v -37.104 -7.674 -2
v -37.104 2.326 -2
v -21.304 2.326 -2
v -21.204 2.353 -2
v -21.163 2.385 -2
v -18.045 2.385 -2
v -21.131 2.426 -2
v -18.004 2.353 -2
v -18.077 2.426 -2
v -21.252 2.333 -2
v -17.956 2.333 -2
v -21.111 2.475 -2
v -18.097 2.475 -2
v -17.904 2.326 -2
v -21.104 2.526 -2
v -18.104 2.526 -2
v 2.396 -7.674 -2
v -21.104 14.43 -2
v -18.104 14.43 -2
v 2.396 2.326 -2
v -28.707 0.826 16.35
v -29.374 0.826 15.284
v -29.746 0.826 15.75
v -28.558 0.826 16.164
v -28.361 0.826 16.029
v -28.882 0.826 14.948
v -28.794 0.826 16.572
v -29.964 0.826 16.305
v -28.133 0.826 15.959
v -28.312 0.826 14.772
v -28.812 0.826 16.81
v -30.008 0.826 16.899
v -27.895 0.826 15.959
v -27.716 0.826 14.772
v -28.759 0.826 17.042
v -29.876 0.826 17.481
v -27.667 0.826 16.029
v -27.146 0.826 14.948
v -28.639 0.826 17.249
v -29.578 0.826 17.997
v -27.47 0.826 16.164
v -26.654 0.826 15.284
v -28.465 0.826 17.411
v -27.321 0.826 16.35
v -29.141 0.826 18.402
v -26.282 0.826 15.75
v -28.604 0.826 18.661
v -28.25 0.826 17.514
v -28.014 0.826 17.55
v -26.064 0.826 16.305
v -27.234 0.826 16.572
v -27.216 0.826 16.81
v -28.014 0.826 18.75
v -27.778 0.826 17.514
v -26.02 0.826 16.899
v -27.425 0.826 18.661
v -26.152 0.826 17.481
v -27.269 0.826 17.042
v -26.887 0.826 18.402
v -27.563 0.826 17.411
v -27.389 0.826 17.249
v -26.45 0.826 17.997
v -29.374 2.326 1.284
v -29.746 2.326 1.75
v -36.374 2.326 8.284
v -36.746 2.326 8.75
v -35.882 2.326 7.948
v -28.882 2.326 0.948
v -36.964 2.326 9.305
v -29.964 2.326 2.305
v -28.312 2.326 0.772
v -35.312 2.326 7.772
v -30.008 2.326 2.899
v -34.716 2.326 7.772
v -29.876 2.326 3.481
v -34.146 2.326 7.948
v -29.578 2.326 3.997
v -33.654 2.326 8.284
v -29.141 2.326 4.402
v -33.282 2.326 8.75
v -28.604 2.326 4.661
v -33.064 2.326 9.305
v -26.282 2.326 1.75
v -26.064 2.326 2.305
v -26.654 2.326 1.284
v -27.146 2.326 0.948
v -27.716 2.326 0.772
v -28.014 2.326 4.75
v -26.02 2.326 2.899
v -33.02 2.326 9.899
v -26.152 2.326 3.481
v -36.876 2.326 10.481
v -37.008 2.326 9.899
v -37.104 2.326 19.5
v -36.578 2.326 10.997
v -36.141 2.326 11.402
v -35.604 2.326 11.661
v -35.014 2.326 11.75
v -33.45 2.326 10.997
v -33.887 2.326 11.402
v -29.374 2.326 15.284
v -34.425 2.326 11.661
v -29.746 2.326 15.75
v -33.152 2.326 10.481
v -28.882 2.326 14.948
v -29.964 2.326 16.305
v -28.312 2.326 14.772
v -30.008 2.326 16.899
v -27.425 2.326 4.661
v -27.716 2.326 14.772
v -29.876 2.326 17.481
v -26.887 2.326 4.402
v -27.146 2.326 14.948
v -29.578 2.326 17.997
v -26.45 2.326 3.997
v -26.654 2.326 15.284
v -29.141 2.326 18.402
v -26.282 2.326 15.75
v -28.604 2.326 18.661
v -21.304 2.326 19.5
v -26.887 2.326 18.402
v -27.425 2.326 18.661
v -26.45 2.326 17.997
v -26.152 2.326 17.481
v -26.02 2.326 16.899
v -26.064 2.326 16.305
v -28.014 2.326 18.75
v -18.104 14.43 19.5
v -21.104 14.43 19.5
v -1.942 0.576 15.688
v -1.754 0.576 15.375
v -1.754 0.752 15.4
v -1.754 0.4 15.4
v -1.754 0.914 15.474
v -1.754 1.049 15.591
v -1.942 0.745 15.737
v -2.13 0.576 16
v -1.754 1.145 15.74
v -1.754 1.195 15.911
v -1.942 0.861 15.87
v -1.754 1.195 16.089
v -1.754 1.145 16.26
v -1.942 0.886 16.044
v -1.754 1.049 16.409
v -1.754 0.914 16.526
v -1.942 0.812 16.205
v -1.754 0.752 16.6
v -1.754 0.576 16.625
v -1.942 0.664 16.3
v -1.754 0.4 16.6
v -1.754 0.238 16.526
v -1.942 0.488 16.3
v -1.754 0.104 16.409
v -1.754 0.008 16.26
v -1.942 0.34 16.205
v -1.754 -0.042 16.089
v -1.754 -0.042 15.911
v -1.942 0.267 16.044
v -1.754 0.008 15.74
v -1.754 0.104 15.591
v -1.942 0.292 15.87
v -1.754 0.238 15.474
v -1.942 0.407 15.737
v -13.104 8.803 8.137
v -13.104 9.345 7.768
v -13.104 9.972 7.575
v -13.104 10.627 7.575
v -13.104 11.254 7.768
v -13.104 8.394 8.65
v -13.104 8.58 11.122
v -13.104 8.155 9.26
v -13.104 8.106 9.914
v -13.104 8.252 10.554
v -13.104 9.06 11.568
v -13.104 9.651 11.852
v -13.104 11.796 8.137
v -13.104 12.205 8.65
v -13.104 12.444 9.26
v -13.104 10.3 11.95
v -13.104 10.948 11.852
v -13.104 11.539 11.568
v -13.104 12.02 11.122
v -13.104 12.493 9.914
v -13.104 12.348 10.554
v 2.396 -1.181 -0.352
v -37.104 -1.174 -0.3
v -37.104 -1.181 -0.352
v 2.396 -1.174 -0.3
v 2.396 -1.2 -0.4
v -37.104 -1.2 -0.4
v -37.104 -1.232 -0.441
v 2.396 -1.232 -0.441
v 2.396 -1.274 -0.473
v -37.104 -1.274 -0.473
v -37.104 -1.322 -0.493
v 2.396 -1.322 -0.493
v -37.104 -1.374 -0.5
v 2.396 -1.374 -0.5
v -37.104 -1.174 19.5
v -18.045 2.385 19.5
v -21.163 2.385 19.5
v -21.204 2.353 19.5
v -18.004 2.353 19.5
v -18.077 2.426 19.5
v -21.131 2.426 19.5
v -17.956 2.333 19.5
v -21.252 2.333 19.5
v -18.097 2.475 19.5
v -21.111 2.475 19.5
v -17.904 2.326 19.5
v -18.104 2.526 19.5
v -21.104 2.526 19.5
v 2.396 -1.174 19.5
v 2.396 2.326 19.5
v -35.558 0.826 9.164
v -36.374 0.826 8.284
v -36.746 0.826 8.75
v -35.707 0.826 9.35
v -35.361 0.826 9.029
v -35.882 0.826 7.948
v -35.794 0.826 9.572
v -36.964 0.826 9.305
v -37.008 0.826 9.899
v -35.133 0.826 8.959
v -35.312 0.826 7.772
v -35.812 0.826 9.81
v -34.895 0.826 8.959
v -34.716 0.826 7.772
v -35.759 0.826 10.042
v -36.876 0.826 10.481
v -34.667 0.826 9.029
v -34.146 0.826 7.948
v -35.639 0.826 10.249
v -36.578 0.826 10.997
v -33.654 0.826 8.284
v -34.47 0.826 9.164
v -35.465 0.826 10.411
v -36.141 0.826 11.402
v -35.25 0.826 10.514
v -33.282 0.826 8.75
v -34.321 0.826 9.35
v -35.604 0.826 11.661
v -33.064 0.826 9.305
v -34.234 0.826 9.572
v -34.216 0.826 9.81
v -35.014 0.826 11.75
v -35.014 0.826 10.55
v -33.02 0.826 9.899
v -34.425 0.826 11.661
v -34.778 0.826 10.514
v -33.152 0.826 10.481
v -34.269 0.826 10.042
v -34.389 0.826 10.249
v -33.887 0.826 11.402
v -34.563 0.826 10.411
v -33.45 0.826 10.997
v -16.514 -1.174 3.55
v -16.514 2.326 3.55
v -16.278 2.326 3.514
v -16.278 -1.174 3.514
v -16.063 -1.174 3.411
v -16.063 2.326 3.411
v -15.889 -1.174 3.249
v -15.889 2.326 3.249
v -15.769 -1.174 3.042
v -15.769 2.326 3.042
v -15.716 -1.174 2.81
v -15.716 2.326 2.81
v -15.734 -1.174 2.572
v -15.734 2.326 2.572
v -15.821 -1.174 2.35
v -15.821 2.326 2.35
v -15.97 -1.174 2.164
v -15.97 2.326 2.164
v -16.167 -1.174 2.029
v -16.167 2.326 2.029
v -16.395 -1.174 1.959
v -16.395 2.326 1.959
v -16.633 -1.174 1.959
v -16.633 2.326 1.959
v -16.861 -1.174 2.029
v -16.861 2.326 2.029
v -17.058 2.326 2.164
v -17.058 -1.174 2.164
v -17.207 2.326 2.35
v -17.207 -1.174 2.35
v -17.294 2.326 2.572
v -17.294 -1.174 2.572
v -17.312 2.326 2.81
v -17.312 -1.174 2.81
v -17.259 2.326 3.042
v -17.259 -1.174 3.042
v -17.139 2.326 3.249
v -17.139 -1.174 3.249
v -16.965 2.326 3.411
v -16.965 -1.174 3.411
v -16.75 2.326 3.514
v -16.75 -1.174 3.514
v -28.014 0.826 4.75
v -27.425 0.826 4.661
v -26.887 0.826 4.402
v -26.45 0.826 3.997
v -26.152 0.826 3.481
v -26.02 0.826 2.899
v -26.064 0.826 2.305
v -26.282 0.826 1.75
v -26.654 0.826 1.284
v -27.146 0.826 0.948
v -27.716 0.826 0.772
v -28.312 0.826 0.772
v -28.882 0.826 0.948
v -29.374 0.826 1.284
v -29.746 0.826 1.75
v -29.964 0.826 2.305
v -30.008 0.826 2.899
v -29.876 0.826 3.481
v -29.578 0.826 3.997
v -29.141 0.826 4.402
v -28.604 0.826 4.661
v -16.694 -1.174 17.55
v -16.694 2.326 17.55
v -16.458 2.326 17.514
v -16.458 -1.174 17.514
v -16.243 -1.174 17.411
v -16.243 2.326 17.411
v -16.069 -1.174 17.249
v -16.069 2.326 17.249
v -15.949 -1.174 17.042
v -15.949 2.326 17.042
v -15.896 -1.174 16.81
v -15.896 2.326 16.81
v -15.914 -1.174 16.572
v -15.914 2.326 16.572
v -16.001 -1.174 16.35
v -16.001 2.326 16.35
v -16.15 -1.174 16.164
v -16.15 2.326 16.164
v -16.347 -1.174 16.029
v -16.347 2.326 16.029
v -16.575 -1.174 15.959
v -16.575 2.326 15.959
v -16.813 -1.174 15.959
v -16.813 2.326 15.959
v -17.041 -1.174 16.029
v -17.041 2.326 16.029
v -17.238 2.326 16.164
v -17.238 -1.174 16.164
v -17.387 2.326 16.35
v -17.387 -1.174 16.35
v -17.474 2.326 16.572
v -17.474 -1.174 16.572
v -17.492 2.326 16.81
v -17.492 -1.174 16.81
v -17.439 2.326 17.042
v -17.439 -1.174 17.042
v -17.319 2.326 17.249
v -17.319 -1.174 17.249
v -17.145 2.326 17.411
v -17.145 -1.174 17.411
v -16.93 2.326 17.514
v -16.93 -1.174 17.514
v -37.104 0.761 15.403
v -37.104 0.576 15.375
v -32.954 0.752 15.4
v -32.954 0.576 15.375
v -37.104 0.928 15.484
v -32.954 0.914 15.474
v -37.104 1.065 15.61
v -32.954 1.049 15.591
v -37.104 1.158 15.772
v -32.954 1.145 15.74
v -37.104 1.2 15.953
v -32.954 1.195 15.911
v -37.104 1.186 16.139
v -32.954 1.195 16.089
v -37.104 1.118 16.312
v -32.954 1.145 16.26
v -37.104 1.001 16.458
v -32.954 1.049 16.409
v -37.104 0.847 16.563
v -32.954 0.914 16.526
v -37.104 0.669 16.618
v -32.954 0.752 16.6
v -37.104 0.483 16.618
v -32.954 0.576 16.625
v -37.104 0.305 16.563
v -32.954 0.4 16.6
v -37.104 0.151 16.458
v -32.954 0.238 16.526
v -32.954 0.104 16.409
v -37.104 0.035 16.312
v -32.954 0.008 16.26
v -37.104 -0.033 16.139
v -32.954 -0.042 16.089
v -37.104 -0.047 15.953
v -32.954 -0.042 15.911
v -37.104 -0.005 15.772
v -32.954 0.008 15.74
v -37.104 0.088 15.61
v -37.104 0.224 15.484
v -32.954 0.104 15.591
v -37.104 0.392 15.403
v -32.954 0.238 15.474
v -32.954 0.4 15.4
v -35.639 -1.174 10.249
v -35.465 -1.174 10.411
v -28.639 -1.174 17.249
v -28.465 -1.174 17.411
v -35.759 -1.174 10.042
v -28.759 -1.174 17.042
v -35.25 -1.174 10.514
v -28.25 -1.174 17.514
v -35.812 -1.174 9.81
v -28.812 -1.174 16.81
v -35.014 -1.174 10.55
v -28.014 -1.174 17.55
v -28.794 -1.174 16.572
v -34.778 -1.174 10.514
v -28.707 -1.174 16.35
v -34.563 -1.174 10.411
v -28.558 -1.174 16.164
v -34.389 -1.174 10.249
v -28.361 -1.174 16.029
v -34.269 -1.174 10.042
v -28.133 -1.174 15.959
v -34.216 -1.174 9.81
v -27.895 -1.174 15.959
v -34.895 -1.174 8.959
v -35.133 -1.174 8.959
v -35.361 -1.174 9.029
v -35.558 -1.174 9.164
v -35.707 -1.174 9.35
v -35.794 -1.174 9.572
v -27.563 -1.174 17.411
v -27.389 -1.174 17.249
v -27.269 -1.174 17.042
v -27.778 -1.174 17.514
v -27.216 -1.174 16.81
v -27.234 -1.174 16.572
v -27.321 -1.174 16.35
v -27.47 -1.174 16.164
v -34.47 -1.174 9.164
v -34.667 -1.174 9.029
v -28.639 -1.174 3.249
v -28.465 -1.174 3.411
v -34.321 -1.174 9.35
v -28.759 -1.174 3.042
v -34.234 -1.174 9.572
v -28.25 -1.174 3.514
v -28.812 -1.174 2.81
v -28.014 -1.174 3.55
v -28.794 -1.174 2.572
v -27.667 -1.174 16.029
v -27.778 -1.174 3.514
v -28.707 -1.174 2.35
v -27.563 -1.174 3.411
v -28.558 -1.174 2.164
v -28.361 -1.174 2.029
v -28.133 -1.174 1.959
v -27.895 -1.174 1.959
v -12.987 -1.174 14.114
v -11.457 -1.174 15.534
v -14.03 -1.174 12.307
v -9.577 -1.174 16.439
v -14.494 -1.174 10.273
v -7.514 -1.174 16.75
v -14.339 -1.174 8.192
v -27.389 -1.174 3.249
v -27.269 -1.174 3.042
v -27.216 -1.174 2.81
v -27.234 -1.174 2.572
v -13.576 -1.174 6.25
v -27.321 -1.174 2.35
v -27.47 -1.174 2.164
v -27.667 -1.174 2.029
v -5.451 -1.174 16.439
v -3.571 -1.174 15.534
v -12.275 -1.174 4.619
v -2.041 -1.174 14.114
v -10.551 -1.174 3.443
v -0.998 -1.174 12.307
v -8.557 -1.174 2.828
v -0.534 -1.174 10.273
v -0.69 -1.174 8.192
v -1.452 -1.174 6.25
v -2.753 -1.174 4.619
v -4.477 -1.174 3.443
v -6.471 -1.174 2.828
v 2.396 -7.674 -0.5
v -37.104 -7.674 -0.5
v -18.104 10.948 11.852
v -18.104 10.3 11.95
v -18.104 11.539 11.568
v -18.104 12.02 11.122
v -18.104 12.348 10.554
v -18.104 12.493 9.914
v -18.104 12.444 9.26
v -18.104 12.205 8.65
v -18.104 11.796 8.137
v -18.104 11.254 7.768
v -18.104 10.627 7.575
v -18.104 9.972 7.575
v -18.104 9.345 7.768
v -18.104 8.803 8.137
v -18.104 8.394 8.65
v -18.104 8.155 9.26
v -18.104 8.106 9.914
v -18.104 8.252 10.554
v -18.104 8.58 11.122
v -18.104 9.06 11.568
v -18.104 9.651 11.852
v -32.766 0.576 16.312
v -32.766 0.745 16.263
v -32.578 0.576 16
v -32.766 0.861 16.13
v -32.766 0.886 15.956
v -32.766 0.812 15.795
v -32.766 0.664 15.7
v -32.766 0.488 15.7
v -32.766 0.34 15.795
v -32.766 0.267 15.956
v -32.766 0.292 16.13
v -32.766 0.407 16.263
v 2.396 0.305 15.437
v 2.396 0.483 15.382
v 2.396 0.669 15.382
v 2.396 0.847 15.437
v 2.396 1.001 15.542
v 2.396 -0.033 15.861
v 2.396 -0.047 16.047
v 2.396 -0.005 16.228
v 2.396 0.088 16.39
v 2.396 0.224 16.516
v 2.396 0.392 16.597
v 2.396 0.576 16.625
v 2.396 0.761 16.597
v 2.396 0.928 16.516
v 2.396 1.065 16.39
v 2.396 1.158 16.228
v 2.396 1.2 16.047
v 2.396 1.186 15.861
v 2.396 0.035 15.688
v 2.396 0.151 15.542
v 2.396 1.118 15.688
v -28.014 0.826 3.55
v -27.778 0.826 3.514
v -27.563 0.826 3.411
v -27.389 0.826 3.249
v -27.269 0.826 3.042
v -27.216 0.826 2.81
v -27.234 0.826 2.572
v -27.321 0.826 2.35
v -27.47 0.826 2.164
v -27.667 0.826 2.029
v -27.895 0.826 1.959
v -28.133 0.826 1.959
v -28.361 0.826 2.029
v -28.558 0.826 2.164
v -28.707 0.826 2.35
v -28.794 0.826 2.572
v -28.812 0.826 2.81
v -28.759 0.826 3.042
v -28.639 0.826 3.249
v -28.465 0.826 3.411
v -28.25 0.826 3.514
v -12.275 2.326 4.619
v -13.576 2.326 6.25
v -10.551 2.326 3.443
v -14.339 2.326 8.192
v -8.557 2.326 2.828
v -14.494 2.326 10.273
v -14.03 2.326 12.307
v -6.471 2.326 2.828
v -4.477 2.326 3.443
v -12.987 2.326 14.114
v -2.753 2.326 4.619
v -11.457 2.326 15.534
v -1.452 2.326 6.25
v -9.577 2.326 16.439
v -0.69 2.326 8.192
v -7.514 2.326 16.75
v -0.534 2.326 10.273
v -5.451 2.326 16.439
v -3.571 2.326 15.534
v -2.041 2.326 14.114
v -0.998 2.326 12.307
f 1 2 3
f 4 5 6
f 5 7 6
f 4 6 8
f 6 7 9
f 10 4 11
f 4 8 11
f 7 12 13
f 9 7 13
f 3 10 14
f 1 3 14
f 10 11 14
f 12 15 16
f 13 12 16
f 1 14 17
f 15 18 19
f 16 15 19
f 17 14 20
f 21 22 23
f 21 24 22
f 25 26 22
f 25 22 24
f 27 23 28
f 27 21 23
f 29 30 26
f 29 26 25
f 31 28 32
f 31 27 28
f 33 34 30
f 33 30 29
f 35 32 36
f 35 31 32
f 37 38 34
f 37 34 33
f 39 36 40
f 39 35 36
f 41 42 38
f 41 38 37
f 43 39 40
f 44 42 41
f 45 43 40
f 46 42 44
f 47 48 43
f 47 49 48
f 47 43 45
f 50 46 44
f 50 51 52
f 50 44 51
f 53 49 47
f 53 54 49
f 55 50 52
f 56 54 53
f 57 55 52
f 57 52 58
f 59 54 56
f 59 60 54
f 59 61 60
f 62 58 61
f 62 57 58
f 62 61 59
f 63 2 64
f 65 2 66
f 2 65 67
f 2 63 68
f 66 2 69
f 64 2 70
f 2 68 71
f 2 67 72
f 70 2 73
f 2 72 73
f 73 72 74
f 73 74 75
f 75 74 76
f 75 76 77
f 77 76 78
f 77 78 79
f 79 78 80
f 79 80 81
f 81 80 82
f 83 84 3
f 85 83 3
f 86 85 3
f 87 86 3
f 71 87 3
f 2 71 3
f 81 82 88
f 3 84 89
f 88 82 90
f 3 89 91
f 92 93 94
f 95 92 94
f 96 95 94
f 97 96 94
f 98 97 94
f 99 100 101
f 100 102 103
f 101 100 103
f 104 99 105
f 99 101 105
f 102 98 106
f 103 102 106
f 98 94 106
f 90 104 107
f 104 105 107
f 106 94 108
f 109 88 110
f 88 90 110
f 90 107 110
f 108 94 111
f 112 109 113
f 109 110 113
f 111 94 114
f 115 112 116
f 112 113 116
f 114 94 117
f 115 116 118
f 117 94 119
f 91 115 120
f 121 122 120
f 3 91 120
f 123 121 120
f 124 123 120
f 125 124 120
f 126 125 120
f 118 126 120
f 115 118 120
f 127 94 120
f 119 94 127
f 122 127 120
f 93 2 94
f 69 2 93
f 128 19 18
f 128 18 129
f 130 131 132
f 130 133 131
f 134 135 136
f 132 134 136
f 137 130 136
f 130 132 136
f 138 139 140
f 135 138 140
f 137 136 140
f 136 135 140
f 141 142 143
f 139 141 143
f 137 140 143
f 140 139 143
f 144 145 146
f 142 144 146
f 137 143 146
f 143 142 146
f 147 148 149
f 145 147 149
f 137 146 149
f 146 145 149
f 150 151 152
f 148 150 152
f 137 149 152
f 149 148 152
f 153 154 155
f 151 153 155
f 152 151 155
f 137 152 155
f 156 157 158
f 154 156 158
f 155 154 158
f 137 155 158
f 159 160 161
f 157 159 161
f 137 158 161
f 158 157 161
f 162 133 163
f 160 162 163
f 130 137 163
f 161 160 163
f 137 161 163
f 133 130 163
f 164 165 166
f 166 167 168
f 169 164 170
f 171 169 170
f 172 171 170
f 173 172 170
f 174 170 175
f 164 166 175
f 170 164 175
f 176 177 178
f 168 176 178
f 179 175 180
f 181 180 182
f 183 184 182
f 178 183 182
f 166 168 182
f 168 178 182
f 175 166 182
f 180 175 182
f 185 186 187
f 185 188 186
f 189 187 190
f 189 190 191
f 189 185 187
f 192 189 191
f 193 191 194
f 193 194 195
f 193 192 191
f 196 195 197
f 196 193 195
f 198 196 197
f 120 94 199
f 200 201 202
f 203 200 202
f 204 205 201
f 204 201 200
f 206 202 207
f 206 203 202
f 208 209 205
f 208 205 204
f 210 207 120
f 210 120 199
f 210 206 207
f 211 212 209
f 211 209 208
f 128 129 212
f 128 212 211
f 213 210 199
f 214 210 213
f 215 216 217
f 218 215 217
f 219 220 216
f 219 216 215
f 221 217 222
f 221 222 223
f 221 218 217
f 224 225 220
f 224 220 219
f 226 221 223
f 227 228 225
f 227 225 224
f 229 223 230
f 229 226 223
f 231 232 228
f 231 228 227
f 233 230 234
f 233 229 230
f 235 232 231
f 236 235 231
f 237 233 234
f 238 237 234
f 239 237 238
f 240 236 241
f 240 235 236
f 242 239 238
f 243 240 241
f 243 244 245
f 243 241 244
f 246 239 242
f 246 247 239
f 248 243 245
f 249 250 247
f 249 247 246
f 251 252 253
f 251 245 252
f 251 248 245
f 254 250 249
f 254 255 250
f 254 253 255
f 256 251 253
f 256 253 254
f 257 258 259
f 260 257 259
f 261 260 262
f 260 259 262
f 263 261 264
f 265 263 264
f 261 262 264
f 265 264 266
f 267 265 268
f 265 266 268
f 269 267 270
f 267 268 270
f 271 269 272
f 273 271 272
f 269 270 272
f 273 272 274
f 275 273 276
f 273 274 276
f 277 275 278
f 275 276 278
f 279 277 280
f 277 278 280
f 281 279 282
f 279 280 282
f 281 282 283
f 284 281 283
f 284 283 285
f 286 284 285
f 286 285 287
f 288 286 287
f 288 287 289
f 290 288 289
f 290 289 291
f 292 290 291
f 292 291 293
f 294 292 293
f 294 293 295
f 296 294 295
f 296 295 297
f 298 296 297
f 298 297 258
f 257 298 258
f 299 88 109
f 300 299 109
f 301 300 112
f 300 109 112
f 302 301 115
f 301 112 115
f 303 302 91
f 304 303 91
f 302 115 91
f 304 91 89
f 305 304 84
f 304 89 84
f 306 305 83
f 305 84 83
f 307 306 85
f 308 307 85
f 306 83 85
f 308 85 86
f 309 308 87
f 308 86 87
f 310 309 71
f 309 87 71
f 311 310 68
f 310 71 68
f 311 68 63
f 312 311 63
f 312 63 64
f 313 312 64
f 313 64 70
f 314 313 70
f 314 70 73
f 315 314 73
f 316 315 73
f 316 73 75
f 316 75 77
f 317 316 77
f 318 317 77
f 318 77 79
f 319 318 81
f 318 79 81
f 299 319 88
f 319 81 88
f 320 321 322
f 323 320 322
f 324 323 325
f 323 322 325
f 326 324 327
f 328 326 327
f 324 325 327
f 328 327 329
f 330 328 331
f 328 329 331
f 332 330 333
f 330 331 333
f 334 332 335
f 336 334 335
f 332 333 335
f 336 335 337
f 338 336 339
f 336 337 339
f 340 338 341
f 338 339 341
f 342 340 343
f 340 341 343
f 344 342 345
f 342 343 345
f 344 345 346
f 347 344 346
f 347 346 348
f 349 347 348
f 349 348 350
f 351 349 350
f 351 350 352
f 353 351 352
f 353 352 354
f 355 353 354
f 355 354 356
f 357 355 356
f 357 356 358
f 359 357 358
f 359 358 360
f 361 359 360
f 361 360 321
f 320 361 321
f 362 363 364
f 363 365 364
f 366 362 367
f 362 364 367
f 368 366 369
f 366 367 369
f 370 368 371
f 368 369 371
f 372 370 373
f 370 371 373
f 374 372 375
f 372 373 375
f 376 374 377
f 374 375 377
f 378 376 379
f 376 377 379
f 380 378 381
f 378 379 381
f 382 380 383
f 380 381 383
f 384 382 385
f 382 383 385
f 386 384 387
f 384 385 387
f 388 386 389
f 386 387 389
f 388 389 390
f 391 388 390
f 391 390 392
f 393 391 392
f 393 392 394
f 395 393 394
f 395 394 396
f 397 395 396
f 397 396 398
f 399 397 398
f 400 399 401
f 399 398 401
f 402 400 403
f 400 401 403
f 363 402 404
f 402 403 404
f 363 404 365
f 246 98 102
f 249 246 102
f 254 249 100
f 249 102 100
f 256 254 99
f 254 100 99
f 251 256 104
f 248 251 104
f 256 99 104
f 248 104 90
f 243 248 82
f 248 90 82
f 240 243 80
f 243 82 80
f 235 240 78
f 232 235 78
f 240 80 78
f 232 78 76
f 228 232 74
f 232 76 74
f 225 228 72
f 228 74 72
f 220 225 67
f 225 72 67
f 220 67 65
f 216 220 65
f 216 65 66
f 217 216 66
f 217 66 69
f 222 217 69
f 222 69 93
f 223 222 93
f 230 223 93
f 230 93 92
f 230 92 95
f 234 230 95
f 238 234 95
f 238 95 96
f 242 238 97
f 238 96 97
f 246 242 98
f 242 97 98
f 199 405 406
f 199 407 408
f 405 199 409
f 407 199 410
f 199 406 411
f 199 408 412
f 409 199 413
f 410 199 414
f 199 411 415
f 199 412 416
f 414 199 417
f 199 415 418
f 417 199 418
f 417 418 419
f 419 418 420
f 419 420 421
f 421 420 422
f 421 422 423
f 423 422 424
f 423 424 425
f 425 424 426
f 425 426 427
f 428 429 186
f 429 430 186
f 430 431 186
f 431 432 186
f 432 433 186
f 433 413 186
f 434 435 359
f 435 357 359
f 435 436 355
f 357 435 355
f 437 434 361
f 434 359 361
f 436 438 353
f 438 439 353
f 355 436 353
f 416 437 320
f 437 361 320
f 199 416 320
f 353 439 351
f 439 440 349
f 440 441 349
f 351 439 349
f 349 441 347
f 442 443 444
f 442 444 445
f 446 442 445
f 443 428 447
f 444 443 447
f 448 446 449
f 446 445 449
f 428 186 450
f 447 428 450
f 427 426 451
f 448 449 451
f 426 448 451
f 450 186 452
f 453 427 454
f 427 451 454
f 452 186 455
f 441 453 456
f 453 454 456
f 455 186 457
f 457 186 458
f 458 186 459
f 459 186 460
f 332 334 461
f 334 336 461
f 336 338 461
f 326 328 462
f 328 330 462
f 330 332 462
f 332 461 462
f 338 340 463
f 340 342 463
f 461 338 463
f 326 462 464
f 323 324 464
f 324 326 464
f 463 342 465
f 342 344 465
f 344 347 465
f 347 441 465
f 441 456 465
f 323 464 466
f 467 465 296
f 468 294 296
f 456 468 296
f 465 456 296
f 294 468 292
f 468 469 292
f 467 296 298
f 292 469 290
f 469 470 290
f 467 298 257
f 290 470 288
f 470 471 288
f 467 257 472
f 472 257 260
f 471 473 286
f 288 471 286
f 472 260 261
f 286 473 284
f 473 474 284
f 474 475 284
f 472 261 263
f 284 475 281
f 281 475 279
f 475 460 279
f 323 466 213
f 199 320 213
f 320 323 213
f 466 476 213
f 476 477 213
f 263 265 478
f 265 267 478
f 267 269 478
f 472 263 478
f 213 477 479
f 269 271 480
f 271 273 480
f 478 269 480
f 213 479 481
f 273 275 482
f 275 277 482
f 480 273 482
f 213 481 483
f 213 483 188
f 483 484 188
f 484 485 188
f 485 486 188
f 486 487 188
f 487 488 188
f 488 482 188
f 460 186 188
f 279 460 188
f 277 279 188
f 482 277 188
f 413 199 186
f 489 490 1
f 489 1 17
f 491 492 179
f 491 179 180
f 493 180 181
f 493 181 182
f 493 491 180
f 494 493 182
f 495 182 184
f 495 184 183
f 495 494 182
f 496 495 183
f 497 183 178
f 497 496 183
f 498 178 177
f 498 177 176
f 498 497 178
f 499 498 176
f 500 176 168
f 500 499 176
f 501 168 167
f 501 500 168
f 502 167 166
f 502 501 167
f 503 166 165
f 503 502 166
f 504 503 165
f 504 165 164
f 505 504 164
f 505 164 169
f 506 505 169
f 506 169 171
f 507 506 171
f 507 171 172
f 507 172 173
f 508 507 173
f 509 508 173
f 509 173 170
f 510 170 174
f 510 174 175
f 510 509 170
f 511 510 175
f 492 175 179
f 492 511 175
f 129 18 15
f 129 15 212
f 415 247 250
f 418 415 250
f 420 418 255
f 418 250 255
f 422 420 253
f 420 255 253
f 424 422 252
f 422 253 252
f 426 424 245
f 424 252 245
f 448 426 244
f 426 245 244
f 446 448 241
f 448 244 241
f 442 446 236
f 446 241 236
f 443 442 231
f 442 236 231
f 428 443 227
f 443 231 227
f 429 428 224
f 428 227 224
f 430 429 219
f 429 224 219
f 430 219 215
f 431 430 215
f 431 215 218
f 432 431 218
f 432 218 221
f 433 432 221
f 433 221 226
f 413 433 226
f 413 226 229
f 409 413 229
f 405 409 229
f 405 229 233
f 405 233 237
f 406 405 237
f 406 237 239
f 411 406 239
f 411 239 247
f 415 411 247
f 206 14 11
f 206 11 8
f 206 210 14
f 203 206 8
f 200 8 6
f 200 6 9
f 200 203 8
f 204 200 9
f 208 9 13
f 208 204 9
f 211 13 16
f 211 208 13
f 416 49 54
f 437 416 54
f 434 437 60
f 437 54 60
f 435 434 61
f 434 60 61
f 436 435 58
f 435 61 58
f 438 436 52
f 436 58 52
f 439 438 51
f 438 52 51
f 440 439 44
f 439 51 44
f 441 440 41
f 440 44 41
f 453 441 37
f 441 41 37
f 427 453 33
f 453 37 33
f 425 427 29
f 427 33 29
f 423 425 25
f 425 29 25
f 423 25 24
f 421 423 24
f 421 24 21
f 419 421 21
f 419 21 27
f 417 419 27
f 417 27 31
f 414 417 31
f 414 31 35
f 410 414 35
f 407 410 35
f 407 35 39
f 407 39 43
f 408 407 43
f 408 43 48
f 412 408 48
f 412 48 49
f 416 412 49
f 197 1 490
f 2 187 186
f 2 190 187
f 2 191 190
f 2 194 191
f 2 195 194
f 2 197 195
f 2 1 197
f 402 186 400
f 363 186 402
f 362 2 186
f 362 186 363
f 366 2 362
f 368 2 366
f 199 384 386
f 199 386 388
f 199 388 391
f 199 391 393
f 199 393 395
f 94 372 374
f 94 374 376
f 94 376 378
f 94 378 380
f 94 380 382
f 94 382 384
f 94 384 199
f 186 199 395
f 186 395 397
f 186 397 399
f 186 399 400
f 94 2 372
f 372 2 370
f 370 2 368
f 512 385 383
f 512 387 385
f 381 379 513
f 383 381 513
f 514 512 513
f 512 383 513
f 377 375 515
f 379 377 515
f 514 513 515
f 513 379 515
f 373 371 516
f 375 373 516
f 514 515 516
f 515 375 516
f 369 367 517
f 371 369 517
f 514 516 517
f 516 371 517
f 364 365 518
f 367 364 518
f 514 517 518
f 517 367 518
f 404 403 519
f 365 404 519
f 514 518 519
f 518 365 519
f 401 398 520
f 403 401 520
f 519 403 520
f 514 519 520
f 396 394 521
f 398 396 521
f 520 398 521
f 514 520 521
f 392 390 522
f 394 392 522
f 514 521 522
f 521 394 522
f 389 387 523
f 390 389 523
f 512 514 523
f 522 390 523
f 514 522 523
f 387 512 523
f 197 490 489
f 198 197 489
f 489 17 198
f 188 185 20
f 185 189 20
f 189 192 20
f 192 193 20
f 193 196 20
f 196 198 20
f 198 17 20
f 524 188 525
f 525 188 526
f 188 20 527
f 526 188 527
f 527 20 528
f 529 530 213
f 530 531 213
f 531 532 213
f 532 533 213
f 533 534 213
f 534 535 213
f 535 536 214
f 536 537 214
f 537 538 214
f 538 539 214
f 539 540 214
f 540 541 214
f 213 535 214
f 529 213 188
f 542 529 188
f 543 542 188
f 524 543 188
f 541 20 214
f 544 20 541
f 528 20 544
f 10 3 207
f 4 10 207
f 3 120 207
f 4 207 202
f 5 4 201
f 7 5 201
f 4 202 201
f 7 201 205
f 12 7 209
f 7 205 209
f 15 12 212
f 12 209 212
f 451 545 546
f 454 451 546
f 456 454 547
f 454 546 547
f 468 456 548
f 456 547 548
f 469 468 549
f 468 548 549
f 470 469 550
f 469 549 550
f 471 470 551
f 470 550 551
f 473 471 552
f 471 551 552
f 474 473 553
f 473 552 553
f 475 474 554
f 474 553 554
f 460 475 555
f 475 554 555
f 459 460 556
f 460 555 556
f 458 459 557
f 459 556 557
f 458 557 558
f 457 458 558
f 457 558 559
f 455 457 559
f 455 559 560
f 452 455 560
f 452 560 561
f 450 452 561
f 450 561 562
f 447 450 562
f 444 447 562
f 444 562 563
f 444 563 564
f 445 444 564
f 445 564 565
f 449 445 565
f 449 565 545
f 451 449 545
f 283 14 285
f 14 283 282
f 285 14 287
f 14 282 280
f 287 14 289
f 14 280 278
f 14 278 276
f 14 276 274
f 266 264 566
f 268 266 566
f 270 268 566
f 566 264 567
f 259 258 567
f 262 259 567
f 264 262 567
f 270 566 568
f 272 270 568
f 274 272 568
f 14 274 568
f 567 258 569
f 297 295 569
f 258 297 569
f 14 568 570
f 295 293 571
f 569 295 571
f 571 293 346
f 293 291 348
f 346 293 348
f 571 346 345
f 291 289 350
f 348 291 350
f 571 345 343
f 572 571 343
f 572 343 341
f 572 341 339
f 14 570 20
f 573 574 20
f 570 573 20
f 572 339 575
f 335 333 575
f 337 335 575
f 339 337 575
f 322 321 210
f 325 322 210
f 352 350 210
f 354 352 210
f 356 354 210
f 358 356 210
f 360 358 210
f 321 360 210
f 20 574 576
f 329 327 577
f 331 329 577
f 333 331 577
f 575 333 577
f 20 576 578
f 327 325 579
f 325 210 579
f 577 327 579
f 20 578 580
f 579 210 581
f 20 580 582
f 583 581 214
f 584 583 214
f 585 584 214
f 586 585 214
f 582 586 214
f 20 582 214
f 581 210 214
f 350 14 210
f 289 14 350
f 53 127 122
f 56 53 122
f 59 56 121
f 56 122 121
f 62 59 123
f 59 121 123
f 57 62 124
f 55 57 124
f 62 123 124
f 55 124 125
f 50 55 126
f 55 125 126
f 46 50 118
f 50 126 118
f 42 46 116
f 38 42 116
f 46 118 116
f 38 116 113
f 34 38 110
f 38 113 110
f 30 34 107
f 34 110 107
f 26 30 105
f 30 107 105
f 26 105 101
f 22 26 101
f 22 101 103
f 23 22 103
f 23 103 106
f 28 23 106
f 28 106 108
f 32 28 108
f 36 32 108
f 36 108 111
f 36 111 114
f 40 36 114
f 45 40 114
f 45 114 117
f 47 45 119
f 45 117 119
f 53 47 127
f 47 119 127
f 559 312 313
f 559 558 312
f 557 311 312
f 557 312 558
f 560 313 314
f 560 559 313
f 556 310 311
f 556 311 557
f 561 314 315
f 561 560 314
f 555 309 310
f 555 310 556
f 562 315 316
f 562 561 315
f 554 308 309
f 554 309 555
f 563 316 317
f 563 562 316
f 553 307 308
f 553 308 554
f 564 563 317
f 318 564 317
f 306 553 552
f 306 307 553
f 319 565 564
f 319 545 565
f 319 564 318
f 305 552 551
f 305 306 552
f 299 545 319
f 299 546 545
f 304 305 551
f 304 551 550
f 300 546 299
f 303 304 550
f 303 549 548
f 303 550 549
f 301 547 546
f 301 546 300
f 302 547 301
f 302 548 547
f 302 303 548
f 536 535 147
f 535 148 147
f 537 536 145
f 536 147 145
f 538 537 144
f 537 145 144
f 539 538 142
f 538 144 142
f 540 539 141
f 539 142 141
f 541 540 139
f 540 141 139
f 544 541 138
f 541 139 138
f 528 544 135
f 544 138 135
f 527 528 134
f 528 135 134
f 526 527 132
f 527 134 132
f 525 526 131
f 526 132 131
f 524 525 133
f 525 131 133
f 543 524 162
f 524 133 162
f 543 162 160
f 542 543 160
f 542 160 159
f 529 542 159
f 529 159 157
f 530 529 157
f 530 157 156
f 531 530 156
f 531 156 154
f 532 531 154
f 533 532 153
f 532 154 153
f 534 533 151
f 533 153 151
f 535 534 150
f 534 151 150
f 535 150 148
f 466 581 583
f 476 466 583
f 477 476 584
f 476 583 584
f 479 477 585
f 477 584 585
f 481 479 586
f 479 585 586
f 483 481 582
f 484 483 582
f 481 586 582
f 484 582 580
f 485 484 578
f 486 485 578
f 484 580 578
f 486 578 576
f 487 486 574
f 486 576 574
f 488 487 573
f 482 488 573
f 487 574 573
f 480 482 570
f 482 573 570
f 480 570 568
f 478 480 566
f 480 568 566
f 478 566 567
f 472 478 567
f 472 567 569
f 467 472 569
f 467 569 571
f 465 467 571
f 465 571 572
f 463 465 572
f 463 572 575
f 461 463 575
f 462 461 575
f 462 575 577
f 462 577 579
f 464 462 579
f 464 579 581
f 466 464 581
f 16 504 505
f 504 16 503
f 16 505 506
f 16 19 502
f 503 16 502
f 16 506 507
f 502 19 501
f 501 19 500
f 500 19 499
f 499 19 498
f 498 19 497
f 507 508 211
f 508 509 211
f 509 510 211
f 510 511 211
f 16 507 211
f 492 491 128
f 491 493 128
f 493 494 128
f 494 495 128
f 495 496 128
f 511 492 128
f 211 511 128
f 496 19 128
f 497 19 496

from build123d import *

# Parameters (mm, degrees)
SKETCH_1_W               = 39.5
SKETCH_1_H               = 3.5
EXTRUDE_1_DEPTH          = 19.5
CUT_EXTRUDE_1_REACH      = 44.062
SKETCH_3_R               = 7
EXTRUDE_START            = -3.5
SKETCH_4_W               = 39.5
SKETCH_4_H               = 2
EXTRUDE_2_DEPTH          = 10
CUT_EXTRUDE_2_REACH      = 45.092
SKETCH_5_R               = 0.8
HOLE_WIZARD_M1_6_1_D     = 1.25
HOLE_WIZARD_M1_6_1_DEPTH = 4.15
HOLE_WIZARD_M1_6_1_TIP   = 0.375537887
HOLE_WIZARD_M1_6_2_D     = 1.25
HOLE_WIZARD_M1_6_2_DEPTH = 4.15
HOLE_WIZARD_M1_6_2_TIP   = 0.375537887
SKETCH_10_W              = 21.5
SKETCH_10_H              = 12.103276992
EXTRUDE_3_DEPTH          = 3
SKETCH_11_R              = 2.2
EXTRUDE_4_DEPTH          = 5
SKETCH_12_W              = 39.5
SKETCH_12_H              = 0.5
CUT_EXTRUDE_3_DEPTH      = 6.5
FILLET_1_R               = 0.2
FILLET_2_R               = 0.2
SKETCH_13_R              = 2
CUT_EXTRUDE_4_DEPTH      = 1.5


with BuildPart() as part:
    # 草图1 → 凸台-拉伸1 (new body)
    with BuildSketch(Plane.XY):
        with Locations((-17.354026846, 0.57630481)):
            Rectangle(SKETCH_1_W, SKETCH_1_H)
    extrude(amount=EXTRUDE_1_DEPTH)

    # 草图3 → 切除-拉伸1 (cut, up to next)
    with BuildSketch(Plane(origin=(0, 2.32630481, 0), x_dir=(1, 0, 0), z_dir=(0, 1, 0)), mode=Mode.PRIVATE) as cut_extrude_1_sk1:
        with Locations(Location((-7.514026846, -9.75, 0), (0, 0, 270))):
            Circle(SKETCH_3_R)
    cut_extrude_1_tool1 = extrude(cut_extrude_1_sk1.sketch, amount=-CUT_EXTRUDE_1_REACH, mode=Mode.PRIVATE) & part.part
    add(cut_extrude_1_tool1.solids().sort_by_distance((-7.514027, 2.326305, 9.75))[0], mode=Mode.SUBTRACT)

    # 草图4 → 凸台-拉伸2 (add)
    with BuildSketch(Plane.XZ.offset(1.17369519).offset(EXTRUDE_START)):
        with Locations((-17.354026846, -1)):
            Rectangle(SKETCH_4_W, SKETCH_4_H)
    extrude(amount=EXTRUDE_2_DEPTH)

    # 草图5 → 切除-拉伸2 (cut, up to next)
    with BuildSketch(Plane(origin=(0, 2.32630481, 0), x_dir=(1, 0, 0), z_dir=(0, 1, 0)), mode=Mode.PRIVATE) as cut_extrude_2_sk1:
        with Locations(Location((-35.014026846, -9.75, 0), (0, 0, 270))):
            Circle(SKETCH_5_R)
    cut_extrude_2_tool1 = extrude(cut_extrude_2_sk1.sketch, amount=-CUT_EXTRUDE_2_REACH, mode=Mode.PRIVATE) & part.part
    # 草图5 → 切除-拉伸2 (cut, up to next)
    with BuildSketch(Plane(origin=(0, 2.32630481, 0), x_dir=(1, 0, 0), z_dir=(0, 1, 0)), mode=Mode.PRIVATE) as cut_extrude_2_sk2:
        with Locations(Location((-28.014026846, -2.75, 0), (0, 0, 270))):
            Circle(SKETCH_5_R)
    cut_extrude_2_tool2 = extrude(cut_extrude_2_sk2.sketch, amount=-CUT_EXTRUDE_2_REACH, mode=Mode.PRIVATE) & part.part
    # 草图5 → 切除-拉伸2 (cut, up to next)
    with BuildSketch(Plane(origin=(0, 2.32630481, 0), x_dir=(1, 0, 0), z_dir=(0, 1, 0)), mode=Mode.PRIVATE) as cut_extrude_2_sk3:
        with Locations(Location((-28.014026846, -16.75, 0), (0, 0, 270))):
            Circle(SKETCH_5_R)
    cut_extrude_2_tool3 = extrude(cut_extrude_2_sk3.sketch, amount=-CUT_EXTRUDE_2_REACH, mode=Mode.PRIVATE) & part.part
    # 草图5 → 切除-拉伸2 (cut, up to next)
    with BuildSketch(Plane(origin=(0, 2.32630481, 0), x_dir=(1, 0, 0), z_dir=(0, 1, 0)), mode=Mode.PRIVATE) as cut_extrude_2_sk4:
        with Locations(Location((-16.514026846, -2.75, 0), (0, 0, 270))):
            Circle(SKETCH_5_R)
    cut_extrude_2_tool4 = extrude(cut_extrude_2_sk4.sketch, amount=-CUT_EXTRUDE_2_REACH, mode=Mode.PRIVATE) & part.part
    # 草图5 → 切除-拉伸2 (cut, up to next)
    with BuildSketch(Plane(origin=(0, 2.32630481, 0), x_dir=(1, 0, 0), z_dir=(0, 1, 0)), mode=Mode.PRIVATE) as cut_extrude_2_sk5:
        with Locations(Location((-16.694026846, -16.75, 0), (0, 0, 270))):
            Circle(SKETCH_5_R)
    cut_extrude_2_tool5 = extrude(cut_extrude_2_sk5.sketch, amount=-CUT_EXTRUDE_2_REACH, mode=Mode.PRIVATE) & part.part
    add(cut_extrude_2_tool1.solids().sort_by_distance((-35.014027, 2.326305, 9.75))[0], mode=Mode.SUBTRACT)
    add(cut_extrude_2_tool2.solids().sort_by_distance((-28.014027, 2.326305, 2.75))[0], mode=Mode.SUBTRACT)
    add(cut_extrude_2_tool3.solids().sort_by_distance((-28.014027, 2.326305, 16.75))[0], mode=Mode.SUBTRACT)
    add(cut_extrude_2_tool4.solids().sort_by_distance((-16.514027, 2.326305, 2.75))[0], mode=Mode.SUBTRACT)
    add(cut_extrude_2_tool5.solids().sort_by_distance((-16.694027, 2.326305, 16.75))[0], mode=Mode.SUBTRACT)

    # M1.6 螺纹孔1
    with Locations(Plane.ZY.offset(37.104026846)):
        with Locations((16, 0.57630481)):
            Hole(HOLE_WIZARD_M1_6_1_D / 2, depth=HOLE_WIZARD_M1_6_1_DEPTH)
            with Locations((0, 0, -(HOLE_WIZARD_M1_6_1_DEPTH + HOLE_WIZARD_M1_6_1_TIP / 2))):  # 118° drill point
                Cone(0, HOLE_WIZARD_M1_6_1_D / 2, HOLE_WIZARD_M1_6_1_TIP, mode=Mode.SUBTRACT)

    # M1.6 螺纹孔2
    with Locations(Plane(origin=(2.395973154, 0, 0), x_dir=(0, 0, -1), z_dir=(1, 0, 0))):
        with Locations((-16, 0.57630481)):
            Hole(HOLE_WIZARD_M1_6_2_D / 2, depth=HOLE_WIZARD_M1_6_2_DEPTH)
            with Locations((0, 0, -(HOLE_WIZARD_M1_6_2_DEPTH + HOLE_WIZARD_M1_6_2_TIP / 2))):  # 118° drill point
                Cone(0, HOLE_WIZARD_M1_6_2_D / 2, HOLE_WIZARD_M1_6_2_TIP, mode=Mode.SUBTRACT)

    # 草图10 → 凸台-拉伸3 (add)
    with BuildSketch(Plane.ZY.offset(18.104026846)):
        with Locations((8.75, 8.377943306)):
            Rectangle(SKETCH_10_W, SKETCH_10_H)
    extrude(amount=EXTRUDE_3_DEPTH)

    # 草图11 → 凸台-拉伸4 (add)
    with BuildSketch(Plane.ZY.offset(18.104026846)):
        with Locations((9.75, 10.299581802)):
            Circle(SKETCH_11_R)
    extrude(amount=-EXTRUDE_4_DEPTH)

    # 草图12 → 切除-拉伸3 (cut)
    with BuildSketch(Plane.XZ.offset(7.67369519)):
        with Locations((-17.354026846, -0.25)):
            Rectangle(SKETCH_12_W, SKETCH_12_H)
    extrude(amount=-CUT_EXTRUDE_3_DEPTH, mode=Mode.SUBTRACT)

    # 圆角1
    fillet_1_edges = [part.edges().sort_by_distance(p)[0] for p in [
        (-17.354026846, -1.17369519, -0.5),
    ]]
    fillet(fillet_1_edges, radius=FILLET_1_R)

    # 圆角2
    fillet_2_edges = [part.edges().sort_by_distance(p)[0] for p in [
        (-18.104026846, 2.32630481, 8.75),
        (-21.104026846, 2.32630481, 8.75),
    ]]
    fillet(fillet_2_edges, radius=FILLET_2_R)

    # 草图13 → 切除-拉伸4 (cut)
    with BuildSketch(Plane(origin=(0, 2.32630481, 0), x_dir=(1, 0, 0), z_dir=(0, 1, 0))):
        with Locations(Location((-28.014026846, -2.75, 0), (0, 0, 270))):
            Circle(SKETCH_13_R)
        with Locations(Location((-28.014026846, -16.75, 0), (0, 0, 270))):
            Circle(SKETCH_13_R)
        with Locations(Location((-35.014026846, -9.75, 0), (0, 0, 270))):
            Circle(SKETCH_13_R)
    extrude(amount=-CUT_EXTRUDE_4_DEPTH, mode=Mode.SUBTRACT)


solid = part.part
